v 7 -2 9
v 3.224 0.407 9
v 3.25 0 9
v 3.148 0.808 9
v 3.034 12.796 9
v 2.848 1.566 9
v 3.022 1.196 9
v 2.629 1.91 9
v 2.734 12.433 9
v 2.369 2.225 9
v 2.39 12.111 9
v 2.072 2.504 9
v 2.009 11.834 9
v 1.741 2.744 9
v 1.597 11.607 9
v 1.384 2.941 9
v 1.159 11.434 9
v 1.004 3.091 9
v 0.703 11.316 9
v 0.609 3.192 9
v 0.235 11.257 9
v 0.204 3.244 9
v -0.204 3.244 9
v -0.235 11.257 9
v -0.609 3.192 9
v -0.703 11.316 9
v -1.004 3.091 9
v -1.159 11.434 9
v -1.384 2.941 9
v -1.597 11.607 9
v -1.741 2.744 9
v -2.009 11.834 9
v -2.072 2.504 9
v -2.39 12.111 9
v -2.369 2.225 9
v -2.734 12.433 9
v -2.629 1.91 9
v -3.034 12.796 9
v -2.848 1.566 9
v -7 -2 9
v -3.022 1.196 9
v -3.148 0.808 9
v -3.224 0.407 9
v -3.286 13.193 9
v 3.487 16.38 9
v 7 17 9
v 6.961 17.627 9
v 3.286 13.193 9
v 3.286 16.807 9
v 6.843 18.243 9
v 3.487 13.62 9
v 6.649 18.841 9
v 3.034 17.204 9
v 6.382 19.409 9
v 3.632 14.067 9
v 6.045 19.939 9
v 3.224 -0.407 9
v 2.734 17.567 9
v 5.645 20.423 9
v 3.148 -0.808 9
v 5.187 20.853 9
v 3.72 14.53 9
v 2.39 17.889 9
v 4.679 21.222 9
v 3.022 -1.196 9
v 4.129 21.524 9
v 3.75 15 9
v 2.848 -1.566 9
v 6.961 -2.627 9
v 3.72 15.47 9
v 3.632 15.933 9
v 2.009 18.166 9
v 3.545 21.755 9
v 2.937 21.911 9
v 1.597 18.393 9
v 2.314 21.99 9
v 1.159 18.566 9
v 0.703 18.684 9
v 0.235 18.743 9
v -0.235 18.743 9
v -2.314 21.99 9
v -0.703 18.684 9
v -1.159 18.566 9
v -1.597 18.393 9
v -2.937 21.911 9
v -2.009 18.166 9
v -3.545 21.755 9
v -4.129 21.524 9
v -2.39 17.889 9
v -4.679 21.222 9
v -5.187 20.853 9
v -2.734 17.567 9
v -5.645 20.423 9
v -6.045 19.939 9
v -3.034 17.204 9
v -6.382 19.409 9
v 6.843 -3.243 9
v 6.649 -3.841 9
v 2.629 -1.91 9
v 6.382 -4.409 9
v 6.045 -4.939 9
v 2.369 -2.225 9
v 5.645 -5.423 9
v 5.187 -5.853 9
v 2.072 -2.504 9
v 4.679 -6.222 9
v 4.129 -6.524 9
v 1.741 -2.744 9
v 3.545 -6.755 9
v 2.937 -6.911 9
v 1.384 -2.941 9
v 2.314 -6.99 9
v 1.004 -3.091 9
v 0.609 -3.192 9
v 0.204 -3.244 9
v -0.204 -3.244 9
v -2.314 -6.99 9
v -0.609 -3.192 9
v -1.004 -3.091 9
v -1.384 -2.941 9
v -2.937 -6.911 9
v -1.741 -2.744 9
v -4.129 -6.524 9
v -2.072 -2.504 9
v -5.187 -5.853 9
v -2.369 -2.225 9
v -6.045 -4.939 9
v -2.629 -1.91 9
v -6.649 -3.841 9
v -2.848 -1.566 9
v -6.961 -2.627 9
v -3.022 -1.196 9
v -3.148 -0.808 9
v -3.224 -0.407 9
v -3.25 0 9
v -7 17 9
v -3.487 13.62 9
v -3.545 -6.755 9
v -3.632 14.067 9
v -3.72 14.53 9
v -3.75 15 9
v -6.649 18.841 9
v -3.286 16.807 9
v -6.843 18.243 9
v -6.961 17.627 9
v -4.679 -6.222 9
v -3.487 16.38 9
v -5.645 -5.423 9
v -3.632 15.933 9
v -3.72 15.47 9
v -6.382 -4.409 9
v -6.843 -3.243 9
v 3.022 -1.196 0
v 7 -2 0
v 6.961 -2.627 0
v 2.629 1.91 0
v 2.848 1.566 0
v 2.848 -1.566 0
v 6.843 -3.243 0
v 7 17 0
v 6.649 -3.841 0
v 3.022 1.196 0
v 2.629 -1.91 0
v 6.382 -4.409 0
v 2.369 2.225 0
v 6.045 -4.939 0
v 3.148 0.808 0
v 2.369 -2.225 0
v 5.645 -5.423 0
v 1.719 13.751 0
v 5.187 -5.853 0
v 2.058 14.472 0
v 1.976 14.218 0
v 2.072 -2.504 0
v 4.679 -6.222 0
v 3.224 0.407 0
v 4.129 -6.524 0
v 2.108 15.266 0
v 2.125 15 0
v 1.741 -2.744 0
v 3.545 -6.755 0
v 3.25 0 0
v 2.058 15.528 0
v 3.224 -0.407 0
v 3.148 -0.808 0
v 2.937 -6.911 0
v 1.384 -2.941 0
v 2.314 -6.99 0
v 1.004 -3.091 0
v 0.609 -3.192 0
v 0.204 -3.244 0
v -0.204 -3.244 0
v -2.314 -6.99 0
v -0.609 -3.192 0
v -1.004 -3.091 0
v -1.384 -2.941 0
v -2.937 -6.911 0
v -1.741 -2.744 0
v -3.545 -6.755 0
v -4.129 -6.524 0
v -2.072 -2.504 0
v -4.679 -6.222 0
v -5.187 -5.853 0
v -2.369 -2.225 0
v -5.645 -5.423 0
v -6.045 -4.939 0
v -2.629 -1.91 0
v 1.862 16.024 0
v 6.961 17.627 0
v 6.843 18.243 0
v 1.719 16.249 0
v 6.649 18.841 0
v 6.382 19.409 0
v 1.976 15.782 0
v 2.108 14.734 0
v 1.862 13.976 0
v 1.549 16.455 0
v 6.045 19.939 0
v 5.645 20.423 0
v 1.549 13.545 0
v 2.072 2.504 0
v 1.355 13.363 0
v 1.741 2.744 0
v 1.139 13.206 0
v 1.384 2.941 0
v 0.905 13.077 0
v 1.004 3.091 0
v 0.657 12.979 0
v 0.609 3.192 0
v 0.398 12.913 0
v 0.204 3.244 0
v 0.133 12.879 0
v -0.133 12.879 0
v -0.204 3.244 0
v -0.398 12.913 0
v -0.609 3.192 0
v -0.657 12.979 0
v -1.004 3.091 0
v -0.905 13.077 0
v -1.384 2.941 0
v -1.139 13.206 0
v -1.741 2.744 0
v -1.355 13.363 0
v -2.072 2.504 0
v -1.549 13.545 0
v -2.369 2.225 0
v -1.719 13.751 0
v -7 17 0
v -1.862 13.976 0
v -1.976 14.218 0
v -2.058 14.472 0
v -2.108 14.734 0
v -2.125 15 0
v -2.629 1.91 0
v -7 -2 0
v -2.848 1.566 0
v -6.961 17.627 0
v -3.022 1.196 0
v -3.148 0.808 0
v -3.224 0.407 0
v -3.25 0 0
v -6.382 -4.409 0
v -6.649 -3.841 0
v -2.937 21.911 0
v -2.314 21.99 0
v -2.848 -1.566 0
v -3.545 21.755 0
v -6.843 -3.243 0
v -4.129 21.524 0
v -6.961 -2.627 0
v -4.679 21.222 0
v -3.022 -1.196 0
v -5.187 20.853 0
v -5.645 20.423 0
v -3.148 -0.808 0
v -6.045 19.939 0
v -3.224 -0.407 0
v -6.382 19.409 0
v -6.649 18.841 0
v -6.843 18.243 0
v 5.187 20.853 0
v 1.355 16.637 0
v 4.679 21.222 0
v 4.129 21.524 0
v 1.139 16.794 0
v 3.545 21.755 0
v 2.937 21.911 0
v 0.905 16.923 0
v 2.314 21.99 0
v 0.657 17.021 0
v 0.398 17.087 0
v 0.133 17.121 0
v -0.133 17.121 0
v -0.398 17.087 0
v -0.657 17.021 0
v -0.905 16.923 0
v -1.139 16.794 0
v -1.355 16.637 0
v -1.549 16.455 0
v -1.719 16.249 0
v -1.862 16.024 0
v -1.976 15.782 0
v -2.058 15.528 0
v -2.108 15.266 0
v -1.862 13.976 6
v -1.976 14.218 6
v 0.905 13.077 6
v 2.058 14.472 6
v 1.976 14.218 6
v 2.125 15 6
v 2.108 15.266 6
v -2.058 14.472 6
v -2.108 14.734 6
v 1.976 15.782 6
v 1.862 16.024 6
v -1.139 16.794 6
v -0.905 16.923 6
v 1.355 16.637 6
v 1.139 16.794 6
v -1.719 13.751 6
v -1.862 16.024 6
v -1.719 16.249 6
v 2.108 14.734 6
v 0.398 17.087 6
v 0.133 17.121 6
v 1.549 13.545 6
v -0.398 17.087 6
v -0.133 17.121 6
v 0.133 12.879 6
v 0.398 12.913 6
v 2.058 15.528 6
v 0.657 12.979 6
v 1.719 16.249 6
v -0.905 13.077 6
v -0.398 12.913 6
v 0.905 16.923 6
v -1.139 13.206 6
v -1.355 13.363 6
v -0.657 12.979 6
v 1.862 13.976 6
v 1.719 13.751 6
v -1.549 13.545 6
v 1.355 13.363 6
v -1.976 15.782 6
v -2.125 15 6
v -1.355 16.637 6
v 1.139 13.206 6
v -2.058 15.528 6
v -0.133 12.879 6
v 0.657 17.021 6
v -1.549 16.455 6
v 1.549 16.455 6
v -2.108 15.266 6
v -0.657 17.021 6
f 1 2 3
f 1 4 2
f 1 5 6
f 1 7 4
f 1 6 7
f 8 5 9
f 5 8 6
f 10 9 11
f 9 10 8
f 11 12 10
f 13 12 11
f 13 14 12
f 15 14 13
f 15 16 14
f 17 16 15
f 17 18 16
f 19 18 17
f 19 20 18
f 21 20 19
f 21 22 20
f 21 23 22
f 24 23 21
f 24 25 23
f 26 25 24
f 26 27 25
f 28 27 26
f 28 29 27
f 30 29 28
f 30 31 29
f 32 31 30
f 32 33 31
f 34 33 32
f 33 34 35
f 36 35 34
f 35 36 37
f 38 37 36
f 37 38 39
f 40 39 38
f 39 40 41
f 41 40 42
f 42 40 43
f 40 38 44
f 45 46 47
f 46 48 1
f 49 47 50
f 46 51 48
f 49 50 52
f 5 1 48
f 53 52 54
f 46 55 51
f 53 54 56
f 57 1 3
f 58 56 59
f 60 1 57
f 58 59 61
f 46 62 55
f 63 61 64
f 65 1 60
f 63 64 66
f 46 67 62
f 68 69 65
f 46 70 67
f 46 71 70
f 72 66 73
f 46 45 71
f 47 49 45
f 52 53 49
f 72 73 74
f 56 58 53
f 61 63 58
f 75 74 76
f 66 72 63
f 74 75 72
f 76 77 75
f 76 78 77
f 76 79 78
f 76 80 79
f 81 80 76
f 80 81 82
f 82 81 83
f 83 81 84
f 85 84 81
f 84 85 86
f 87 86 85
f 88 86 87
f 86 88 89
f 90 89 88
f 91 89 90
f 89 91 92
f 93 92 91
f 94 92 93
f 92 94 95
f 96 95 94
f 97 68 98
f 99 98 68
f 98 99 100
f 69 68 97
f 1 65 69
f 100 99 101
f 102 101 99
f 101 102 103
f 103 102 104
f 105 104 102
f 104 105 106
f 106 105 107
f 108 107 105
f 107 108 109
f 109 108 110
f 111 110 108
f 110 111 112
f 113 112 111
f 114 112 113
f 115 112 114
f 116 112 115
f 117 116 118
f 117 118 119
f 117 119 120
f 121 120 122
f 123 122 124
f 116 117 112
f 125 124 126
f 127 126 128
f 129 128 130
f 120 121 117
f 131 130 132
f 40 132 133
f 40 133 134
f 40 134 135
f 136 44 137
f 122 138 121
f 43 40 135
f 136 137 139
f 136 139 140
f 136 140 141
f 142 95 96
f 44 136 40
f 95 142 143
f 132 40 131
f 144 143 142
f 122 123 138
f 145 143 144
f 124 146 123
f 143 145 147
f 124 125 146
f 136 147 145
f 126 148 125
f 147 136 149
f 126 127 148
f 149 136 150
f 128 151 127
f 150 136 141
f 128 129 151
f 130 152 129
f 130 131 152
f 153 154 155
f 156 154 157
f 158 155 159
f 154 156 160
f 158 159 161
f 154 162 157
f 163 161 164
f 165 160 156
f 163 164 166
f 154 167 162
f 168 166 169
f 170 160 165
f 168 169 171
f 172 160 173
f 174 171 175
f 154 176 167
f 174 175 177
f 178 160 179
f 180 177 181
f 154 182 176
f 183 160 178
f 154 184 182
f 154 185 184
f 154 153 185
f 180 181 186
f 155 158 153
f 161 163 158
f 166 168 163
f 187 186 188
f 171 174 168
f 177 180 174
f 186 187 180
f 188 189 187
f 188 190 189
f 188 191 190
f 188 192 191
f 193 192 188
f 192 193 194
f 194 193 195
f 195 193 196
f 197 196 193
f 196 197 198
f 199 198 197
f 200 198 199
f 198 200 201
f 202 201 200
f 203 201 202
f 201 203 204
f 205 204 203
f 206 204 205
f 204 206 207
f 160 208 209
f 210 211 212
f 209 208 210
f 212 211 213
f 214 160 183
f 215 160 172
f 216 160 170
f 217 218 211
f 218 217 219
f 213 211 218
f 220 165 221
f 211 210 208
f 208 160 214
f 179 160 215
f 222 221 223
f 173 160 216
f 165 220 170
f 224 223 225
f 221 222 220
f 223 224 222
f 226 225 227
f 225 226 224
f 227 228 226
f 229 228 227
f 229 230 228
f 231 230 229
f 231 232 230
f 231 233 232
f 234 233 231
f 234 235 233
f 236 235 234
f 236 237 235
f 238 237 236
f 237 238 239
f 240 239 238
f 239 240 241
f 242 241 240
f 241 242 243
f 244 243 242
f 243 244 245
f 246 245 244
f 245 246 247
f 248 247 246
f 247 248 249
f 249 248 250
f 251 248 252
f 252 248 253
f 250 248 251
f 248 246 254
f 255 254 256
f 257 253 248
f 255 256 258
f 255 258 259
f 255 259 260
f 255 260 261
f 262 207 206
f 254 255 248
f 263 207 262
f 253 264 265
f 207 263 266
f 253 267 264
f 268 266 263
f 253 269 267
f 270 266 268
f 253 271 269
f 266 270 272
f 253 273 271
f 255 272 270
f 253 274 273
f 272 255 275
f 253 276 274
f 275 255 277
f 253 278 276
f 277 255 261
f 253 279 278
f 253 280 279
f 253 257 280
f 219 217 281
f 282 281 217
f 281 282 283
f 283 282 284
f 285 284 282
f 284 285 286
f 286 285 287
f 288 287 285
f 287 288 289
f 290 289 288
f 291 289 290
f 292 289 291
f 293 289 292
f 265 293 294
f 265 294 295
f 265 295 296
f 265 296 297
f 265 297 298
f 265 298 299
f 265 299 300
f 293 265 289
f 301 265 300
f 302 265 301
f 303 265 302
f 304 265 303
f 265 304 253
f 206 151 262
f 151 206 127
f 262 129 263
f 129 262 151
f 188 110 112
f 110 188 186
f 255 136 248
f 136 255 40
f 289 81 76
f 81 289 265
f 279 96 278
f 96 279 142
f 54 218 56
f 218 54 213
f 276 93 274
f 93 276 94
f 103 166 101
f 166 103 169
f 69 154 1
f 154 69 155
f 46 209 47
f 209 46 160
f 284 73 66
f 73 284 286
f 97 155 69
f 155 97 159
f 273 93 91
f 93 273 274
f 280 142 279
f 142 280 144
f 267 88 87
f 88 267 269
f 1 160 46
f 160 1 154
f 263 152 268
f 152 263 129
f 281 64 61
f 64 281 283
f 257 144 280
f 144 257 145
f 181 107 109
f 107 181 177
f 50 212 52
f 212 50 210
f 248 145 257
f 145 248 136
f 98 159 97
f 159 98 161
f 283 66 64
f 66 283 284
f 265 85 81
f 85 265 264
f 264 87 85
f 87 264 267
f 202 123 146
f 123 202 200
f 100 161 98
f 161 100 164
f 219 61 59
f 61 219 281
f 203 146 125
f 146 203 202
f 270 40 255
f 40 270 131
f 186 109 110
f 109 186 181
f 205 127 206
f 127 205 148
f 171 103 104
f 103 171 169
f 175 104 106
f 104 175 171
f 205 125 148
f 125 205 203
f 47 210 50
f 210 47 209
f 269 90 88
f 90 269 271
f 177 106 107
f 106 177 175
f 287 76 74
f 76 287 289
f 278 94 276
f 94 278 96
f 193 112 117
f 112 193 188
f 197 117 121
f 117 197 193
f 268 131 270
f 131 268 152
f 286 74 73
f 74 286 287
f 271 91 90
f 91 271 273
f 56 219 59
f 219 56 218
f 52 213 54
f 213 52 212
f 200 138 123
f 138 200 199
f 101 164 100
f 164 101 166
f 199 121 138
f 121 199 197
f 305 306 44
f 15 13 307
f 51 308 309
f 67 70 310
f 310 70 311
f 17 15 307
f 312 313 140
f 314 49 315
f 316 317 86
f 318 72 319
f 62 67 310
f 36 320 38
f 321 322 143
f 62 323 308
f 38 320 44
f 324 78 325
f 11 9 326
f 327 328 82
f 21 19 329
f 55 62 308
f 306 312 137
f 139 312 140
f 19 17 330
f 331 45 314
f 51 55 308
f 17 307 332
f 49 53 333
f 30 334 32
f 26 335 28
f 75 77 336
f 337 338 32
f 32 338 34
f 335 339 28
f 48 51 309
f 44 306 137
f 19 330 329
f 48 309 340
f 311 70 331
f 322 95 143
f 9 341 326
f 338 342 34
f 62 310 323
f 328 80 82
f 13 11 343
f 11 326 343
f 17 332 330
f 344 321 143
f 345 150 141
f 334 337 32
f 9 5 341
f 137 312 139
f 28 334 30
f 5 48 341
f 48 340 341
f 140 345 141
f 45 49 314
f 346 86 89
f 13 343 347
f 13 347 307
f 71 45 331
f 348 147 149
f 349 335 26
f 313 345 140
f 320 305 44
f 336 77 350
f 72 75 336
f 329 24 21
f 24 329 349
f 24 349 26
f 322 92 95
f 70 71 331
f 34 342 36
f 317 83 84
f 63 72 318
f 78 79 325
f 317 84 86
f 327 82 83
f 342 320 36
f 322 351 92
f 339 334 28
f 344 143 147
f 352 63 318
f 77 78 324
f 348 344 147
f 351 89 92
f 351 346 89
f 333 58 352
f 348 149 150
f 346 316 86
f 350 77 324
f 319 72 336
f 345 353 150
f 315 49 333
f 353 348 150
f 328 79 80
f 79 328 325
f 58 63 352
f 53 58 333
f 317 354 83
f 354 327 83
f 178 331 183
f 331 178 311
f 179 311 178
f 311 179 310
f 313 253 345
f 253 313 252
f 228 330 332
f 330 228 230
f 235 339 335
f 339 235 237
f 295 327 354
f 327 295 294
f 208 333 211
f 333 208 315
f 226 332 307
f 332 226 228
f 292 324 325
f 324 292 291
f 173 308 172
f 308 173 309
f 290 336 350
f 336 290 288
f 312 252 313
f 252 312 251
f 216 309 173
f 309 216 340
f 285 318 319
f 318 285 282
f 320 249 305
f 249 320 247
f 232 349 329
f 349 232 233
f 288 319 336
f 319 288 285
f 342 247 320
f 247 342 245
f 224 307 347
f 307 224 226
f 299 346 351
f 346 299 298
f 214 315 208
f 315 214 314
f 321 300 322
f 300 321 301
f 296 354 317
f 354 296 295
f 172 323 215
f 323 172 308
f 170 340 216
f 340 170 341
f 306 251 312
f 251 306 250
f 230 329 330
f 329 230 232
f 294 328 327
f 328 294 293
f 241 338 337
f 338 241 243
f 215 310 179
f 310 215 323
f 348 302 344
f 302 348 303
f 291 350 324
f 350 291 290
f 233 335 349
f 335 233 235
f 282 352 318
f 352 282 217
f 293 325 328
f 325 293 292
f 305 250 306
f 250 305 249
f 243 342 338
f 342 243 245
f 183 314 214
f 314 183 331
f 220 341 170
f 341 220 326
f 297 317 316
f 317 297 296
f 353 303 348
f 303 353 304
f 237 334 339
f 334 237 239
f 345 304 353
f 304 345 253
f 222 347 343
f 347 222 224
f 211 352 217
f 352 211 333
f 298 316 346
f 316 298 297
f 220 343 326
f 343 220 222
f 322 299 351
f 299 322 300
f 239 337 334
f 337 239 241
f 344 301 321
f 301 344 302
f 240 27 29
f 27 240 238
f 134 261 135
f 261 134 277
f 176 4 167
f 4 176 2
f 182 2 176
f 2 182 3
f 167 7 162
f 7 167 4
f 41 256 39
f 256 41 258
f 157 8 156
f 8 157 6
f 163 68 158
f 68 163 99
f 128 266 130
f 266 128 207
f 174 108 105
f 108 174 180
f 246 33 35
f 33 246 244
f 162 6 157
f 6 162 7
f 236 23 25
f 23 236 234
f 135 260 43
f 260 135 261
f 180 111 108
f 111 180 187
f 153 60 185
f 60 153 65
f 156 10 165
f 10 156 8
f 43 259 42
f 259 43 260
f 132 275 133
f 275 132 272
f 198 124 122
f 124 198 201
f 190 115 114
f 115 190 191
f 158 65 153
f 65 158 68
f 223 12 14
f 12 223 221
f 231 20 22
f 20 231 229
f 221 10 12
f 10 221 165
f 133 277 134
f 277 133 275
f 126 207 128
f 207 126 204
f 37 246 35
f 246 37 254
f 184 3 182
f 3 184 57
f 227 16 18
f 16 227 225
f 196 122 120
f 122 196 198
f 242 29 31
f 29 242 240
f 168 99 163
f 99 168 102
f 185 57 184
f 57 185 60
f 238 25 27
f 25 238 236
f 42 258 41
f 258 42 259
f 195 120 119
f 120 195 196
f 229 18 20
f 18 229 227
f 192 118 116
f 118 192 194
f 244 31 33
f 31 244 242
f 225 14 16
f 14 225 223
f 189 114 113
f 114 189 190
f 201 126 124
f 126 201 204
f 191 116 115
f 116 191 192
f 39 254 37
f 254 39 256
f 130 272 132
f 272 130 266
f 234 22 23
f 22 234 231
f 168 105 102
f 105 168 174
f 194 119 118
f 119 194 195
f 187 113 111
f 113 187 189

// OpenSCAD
$fn = 50;


difference() {
	union() {
		cylinder(h = 9, r = 7.0000000000);
		translate(v = [0.0000000000, 7.5000000000, 0]) {
			hull() {
				translate(v = [-2.0000000000, 9.5000000000, 0]) {
					cylinder(h = 9, r = 5);
				}
				translate(v = [2.0000000000, 9.5000000000, 0]) {
					cylinder(h = 9, r = 5);
				}
				translate(v = [-2.0000000000, -9.5000000000, 0]) {
					cylinder(h = 9, r = 5);
				}
				translate(v = [2.0000000000, -9.5000000000, 0]) {
					cylinder(h = 9, r = 5);
				}
			}
		}
		translate(v = [0.0000000000, 7.5000000000, 0]) {
			hull() {
				translate(v = [-2.0000000000, 9.5000000000, 0]) {
					cylinder(h = 9, r = 5);
				}
				translate(v = [2.0000000000, 9.5000000000, 0]) {
					cylinder(h = 9, r = 5);
				}
				translate(v = [-2.0000000000, -9.5000000000, 0]) {
					cylinder(h = 9, r = 5);
				}
				translate(v = [2.0000000000, -9.5000000000, 0]) {
					cylinder(h = 9, r = 5);
				}
			}
		}
	}
	union() {
		translate(v = [0.0000000000, 15.0000000000, 9]) {
			rotate(a = [0, 0, 0]) {
				difference() {
					union() {
						#translate(v = [0, 0, -9.0000000000]) {
							cylinder(h = 9, r = 2.0000000000);
						}
						#translate(v = [0, 0, -3]) {
							cylinder(h = 3, r1 = 2.1250000000, r2 = 3.7500000000);
						}
						#translate(v = [0, 0, -9.0000000000]) {
							cylinder(h = 9, r = 2.1250000000);
						}
						#translate(v = [0, 0, -9.0000000000]) {
							cylinder(h = 9, r = 2.0000000000);
						}
					}
					union();
				}
			}
		}
		translate(v = [0.0000000000, 15.0000000000, 9]) {
			rotate(a = [0, 0, 0]) {
				difference() {
					union() {
						#translate(v = [0, 0, -9.0000000000]) {
							cylinder(h = 9, r = 2.0000000000);
						}
						#translate(v = [0, 0, -3]) {
							cylinder(h = 3, r1 = 2.1250000000, r2 = 3.7500000000);
						}
						#translate(v = [0, 0, -9.0000000000]) {
							cylinder(h = 9, r = 2.1250000000);
						}
						#translate(v = [0, 0, -9.0000000000]) {
							cylinder(h = 9, r = 2.0000000000);
						}
					}
					union();
				}
			}
		}
		translate(v = [0, 0, -100]) {
			cylinder(h = 200, r = 3.2500000000);
		}
		translate(v = [0, 0, -100]) {
			cylinder(h = 200, r = 1.8000000000);
		}
	}
}
